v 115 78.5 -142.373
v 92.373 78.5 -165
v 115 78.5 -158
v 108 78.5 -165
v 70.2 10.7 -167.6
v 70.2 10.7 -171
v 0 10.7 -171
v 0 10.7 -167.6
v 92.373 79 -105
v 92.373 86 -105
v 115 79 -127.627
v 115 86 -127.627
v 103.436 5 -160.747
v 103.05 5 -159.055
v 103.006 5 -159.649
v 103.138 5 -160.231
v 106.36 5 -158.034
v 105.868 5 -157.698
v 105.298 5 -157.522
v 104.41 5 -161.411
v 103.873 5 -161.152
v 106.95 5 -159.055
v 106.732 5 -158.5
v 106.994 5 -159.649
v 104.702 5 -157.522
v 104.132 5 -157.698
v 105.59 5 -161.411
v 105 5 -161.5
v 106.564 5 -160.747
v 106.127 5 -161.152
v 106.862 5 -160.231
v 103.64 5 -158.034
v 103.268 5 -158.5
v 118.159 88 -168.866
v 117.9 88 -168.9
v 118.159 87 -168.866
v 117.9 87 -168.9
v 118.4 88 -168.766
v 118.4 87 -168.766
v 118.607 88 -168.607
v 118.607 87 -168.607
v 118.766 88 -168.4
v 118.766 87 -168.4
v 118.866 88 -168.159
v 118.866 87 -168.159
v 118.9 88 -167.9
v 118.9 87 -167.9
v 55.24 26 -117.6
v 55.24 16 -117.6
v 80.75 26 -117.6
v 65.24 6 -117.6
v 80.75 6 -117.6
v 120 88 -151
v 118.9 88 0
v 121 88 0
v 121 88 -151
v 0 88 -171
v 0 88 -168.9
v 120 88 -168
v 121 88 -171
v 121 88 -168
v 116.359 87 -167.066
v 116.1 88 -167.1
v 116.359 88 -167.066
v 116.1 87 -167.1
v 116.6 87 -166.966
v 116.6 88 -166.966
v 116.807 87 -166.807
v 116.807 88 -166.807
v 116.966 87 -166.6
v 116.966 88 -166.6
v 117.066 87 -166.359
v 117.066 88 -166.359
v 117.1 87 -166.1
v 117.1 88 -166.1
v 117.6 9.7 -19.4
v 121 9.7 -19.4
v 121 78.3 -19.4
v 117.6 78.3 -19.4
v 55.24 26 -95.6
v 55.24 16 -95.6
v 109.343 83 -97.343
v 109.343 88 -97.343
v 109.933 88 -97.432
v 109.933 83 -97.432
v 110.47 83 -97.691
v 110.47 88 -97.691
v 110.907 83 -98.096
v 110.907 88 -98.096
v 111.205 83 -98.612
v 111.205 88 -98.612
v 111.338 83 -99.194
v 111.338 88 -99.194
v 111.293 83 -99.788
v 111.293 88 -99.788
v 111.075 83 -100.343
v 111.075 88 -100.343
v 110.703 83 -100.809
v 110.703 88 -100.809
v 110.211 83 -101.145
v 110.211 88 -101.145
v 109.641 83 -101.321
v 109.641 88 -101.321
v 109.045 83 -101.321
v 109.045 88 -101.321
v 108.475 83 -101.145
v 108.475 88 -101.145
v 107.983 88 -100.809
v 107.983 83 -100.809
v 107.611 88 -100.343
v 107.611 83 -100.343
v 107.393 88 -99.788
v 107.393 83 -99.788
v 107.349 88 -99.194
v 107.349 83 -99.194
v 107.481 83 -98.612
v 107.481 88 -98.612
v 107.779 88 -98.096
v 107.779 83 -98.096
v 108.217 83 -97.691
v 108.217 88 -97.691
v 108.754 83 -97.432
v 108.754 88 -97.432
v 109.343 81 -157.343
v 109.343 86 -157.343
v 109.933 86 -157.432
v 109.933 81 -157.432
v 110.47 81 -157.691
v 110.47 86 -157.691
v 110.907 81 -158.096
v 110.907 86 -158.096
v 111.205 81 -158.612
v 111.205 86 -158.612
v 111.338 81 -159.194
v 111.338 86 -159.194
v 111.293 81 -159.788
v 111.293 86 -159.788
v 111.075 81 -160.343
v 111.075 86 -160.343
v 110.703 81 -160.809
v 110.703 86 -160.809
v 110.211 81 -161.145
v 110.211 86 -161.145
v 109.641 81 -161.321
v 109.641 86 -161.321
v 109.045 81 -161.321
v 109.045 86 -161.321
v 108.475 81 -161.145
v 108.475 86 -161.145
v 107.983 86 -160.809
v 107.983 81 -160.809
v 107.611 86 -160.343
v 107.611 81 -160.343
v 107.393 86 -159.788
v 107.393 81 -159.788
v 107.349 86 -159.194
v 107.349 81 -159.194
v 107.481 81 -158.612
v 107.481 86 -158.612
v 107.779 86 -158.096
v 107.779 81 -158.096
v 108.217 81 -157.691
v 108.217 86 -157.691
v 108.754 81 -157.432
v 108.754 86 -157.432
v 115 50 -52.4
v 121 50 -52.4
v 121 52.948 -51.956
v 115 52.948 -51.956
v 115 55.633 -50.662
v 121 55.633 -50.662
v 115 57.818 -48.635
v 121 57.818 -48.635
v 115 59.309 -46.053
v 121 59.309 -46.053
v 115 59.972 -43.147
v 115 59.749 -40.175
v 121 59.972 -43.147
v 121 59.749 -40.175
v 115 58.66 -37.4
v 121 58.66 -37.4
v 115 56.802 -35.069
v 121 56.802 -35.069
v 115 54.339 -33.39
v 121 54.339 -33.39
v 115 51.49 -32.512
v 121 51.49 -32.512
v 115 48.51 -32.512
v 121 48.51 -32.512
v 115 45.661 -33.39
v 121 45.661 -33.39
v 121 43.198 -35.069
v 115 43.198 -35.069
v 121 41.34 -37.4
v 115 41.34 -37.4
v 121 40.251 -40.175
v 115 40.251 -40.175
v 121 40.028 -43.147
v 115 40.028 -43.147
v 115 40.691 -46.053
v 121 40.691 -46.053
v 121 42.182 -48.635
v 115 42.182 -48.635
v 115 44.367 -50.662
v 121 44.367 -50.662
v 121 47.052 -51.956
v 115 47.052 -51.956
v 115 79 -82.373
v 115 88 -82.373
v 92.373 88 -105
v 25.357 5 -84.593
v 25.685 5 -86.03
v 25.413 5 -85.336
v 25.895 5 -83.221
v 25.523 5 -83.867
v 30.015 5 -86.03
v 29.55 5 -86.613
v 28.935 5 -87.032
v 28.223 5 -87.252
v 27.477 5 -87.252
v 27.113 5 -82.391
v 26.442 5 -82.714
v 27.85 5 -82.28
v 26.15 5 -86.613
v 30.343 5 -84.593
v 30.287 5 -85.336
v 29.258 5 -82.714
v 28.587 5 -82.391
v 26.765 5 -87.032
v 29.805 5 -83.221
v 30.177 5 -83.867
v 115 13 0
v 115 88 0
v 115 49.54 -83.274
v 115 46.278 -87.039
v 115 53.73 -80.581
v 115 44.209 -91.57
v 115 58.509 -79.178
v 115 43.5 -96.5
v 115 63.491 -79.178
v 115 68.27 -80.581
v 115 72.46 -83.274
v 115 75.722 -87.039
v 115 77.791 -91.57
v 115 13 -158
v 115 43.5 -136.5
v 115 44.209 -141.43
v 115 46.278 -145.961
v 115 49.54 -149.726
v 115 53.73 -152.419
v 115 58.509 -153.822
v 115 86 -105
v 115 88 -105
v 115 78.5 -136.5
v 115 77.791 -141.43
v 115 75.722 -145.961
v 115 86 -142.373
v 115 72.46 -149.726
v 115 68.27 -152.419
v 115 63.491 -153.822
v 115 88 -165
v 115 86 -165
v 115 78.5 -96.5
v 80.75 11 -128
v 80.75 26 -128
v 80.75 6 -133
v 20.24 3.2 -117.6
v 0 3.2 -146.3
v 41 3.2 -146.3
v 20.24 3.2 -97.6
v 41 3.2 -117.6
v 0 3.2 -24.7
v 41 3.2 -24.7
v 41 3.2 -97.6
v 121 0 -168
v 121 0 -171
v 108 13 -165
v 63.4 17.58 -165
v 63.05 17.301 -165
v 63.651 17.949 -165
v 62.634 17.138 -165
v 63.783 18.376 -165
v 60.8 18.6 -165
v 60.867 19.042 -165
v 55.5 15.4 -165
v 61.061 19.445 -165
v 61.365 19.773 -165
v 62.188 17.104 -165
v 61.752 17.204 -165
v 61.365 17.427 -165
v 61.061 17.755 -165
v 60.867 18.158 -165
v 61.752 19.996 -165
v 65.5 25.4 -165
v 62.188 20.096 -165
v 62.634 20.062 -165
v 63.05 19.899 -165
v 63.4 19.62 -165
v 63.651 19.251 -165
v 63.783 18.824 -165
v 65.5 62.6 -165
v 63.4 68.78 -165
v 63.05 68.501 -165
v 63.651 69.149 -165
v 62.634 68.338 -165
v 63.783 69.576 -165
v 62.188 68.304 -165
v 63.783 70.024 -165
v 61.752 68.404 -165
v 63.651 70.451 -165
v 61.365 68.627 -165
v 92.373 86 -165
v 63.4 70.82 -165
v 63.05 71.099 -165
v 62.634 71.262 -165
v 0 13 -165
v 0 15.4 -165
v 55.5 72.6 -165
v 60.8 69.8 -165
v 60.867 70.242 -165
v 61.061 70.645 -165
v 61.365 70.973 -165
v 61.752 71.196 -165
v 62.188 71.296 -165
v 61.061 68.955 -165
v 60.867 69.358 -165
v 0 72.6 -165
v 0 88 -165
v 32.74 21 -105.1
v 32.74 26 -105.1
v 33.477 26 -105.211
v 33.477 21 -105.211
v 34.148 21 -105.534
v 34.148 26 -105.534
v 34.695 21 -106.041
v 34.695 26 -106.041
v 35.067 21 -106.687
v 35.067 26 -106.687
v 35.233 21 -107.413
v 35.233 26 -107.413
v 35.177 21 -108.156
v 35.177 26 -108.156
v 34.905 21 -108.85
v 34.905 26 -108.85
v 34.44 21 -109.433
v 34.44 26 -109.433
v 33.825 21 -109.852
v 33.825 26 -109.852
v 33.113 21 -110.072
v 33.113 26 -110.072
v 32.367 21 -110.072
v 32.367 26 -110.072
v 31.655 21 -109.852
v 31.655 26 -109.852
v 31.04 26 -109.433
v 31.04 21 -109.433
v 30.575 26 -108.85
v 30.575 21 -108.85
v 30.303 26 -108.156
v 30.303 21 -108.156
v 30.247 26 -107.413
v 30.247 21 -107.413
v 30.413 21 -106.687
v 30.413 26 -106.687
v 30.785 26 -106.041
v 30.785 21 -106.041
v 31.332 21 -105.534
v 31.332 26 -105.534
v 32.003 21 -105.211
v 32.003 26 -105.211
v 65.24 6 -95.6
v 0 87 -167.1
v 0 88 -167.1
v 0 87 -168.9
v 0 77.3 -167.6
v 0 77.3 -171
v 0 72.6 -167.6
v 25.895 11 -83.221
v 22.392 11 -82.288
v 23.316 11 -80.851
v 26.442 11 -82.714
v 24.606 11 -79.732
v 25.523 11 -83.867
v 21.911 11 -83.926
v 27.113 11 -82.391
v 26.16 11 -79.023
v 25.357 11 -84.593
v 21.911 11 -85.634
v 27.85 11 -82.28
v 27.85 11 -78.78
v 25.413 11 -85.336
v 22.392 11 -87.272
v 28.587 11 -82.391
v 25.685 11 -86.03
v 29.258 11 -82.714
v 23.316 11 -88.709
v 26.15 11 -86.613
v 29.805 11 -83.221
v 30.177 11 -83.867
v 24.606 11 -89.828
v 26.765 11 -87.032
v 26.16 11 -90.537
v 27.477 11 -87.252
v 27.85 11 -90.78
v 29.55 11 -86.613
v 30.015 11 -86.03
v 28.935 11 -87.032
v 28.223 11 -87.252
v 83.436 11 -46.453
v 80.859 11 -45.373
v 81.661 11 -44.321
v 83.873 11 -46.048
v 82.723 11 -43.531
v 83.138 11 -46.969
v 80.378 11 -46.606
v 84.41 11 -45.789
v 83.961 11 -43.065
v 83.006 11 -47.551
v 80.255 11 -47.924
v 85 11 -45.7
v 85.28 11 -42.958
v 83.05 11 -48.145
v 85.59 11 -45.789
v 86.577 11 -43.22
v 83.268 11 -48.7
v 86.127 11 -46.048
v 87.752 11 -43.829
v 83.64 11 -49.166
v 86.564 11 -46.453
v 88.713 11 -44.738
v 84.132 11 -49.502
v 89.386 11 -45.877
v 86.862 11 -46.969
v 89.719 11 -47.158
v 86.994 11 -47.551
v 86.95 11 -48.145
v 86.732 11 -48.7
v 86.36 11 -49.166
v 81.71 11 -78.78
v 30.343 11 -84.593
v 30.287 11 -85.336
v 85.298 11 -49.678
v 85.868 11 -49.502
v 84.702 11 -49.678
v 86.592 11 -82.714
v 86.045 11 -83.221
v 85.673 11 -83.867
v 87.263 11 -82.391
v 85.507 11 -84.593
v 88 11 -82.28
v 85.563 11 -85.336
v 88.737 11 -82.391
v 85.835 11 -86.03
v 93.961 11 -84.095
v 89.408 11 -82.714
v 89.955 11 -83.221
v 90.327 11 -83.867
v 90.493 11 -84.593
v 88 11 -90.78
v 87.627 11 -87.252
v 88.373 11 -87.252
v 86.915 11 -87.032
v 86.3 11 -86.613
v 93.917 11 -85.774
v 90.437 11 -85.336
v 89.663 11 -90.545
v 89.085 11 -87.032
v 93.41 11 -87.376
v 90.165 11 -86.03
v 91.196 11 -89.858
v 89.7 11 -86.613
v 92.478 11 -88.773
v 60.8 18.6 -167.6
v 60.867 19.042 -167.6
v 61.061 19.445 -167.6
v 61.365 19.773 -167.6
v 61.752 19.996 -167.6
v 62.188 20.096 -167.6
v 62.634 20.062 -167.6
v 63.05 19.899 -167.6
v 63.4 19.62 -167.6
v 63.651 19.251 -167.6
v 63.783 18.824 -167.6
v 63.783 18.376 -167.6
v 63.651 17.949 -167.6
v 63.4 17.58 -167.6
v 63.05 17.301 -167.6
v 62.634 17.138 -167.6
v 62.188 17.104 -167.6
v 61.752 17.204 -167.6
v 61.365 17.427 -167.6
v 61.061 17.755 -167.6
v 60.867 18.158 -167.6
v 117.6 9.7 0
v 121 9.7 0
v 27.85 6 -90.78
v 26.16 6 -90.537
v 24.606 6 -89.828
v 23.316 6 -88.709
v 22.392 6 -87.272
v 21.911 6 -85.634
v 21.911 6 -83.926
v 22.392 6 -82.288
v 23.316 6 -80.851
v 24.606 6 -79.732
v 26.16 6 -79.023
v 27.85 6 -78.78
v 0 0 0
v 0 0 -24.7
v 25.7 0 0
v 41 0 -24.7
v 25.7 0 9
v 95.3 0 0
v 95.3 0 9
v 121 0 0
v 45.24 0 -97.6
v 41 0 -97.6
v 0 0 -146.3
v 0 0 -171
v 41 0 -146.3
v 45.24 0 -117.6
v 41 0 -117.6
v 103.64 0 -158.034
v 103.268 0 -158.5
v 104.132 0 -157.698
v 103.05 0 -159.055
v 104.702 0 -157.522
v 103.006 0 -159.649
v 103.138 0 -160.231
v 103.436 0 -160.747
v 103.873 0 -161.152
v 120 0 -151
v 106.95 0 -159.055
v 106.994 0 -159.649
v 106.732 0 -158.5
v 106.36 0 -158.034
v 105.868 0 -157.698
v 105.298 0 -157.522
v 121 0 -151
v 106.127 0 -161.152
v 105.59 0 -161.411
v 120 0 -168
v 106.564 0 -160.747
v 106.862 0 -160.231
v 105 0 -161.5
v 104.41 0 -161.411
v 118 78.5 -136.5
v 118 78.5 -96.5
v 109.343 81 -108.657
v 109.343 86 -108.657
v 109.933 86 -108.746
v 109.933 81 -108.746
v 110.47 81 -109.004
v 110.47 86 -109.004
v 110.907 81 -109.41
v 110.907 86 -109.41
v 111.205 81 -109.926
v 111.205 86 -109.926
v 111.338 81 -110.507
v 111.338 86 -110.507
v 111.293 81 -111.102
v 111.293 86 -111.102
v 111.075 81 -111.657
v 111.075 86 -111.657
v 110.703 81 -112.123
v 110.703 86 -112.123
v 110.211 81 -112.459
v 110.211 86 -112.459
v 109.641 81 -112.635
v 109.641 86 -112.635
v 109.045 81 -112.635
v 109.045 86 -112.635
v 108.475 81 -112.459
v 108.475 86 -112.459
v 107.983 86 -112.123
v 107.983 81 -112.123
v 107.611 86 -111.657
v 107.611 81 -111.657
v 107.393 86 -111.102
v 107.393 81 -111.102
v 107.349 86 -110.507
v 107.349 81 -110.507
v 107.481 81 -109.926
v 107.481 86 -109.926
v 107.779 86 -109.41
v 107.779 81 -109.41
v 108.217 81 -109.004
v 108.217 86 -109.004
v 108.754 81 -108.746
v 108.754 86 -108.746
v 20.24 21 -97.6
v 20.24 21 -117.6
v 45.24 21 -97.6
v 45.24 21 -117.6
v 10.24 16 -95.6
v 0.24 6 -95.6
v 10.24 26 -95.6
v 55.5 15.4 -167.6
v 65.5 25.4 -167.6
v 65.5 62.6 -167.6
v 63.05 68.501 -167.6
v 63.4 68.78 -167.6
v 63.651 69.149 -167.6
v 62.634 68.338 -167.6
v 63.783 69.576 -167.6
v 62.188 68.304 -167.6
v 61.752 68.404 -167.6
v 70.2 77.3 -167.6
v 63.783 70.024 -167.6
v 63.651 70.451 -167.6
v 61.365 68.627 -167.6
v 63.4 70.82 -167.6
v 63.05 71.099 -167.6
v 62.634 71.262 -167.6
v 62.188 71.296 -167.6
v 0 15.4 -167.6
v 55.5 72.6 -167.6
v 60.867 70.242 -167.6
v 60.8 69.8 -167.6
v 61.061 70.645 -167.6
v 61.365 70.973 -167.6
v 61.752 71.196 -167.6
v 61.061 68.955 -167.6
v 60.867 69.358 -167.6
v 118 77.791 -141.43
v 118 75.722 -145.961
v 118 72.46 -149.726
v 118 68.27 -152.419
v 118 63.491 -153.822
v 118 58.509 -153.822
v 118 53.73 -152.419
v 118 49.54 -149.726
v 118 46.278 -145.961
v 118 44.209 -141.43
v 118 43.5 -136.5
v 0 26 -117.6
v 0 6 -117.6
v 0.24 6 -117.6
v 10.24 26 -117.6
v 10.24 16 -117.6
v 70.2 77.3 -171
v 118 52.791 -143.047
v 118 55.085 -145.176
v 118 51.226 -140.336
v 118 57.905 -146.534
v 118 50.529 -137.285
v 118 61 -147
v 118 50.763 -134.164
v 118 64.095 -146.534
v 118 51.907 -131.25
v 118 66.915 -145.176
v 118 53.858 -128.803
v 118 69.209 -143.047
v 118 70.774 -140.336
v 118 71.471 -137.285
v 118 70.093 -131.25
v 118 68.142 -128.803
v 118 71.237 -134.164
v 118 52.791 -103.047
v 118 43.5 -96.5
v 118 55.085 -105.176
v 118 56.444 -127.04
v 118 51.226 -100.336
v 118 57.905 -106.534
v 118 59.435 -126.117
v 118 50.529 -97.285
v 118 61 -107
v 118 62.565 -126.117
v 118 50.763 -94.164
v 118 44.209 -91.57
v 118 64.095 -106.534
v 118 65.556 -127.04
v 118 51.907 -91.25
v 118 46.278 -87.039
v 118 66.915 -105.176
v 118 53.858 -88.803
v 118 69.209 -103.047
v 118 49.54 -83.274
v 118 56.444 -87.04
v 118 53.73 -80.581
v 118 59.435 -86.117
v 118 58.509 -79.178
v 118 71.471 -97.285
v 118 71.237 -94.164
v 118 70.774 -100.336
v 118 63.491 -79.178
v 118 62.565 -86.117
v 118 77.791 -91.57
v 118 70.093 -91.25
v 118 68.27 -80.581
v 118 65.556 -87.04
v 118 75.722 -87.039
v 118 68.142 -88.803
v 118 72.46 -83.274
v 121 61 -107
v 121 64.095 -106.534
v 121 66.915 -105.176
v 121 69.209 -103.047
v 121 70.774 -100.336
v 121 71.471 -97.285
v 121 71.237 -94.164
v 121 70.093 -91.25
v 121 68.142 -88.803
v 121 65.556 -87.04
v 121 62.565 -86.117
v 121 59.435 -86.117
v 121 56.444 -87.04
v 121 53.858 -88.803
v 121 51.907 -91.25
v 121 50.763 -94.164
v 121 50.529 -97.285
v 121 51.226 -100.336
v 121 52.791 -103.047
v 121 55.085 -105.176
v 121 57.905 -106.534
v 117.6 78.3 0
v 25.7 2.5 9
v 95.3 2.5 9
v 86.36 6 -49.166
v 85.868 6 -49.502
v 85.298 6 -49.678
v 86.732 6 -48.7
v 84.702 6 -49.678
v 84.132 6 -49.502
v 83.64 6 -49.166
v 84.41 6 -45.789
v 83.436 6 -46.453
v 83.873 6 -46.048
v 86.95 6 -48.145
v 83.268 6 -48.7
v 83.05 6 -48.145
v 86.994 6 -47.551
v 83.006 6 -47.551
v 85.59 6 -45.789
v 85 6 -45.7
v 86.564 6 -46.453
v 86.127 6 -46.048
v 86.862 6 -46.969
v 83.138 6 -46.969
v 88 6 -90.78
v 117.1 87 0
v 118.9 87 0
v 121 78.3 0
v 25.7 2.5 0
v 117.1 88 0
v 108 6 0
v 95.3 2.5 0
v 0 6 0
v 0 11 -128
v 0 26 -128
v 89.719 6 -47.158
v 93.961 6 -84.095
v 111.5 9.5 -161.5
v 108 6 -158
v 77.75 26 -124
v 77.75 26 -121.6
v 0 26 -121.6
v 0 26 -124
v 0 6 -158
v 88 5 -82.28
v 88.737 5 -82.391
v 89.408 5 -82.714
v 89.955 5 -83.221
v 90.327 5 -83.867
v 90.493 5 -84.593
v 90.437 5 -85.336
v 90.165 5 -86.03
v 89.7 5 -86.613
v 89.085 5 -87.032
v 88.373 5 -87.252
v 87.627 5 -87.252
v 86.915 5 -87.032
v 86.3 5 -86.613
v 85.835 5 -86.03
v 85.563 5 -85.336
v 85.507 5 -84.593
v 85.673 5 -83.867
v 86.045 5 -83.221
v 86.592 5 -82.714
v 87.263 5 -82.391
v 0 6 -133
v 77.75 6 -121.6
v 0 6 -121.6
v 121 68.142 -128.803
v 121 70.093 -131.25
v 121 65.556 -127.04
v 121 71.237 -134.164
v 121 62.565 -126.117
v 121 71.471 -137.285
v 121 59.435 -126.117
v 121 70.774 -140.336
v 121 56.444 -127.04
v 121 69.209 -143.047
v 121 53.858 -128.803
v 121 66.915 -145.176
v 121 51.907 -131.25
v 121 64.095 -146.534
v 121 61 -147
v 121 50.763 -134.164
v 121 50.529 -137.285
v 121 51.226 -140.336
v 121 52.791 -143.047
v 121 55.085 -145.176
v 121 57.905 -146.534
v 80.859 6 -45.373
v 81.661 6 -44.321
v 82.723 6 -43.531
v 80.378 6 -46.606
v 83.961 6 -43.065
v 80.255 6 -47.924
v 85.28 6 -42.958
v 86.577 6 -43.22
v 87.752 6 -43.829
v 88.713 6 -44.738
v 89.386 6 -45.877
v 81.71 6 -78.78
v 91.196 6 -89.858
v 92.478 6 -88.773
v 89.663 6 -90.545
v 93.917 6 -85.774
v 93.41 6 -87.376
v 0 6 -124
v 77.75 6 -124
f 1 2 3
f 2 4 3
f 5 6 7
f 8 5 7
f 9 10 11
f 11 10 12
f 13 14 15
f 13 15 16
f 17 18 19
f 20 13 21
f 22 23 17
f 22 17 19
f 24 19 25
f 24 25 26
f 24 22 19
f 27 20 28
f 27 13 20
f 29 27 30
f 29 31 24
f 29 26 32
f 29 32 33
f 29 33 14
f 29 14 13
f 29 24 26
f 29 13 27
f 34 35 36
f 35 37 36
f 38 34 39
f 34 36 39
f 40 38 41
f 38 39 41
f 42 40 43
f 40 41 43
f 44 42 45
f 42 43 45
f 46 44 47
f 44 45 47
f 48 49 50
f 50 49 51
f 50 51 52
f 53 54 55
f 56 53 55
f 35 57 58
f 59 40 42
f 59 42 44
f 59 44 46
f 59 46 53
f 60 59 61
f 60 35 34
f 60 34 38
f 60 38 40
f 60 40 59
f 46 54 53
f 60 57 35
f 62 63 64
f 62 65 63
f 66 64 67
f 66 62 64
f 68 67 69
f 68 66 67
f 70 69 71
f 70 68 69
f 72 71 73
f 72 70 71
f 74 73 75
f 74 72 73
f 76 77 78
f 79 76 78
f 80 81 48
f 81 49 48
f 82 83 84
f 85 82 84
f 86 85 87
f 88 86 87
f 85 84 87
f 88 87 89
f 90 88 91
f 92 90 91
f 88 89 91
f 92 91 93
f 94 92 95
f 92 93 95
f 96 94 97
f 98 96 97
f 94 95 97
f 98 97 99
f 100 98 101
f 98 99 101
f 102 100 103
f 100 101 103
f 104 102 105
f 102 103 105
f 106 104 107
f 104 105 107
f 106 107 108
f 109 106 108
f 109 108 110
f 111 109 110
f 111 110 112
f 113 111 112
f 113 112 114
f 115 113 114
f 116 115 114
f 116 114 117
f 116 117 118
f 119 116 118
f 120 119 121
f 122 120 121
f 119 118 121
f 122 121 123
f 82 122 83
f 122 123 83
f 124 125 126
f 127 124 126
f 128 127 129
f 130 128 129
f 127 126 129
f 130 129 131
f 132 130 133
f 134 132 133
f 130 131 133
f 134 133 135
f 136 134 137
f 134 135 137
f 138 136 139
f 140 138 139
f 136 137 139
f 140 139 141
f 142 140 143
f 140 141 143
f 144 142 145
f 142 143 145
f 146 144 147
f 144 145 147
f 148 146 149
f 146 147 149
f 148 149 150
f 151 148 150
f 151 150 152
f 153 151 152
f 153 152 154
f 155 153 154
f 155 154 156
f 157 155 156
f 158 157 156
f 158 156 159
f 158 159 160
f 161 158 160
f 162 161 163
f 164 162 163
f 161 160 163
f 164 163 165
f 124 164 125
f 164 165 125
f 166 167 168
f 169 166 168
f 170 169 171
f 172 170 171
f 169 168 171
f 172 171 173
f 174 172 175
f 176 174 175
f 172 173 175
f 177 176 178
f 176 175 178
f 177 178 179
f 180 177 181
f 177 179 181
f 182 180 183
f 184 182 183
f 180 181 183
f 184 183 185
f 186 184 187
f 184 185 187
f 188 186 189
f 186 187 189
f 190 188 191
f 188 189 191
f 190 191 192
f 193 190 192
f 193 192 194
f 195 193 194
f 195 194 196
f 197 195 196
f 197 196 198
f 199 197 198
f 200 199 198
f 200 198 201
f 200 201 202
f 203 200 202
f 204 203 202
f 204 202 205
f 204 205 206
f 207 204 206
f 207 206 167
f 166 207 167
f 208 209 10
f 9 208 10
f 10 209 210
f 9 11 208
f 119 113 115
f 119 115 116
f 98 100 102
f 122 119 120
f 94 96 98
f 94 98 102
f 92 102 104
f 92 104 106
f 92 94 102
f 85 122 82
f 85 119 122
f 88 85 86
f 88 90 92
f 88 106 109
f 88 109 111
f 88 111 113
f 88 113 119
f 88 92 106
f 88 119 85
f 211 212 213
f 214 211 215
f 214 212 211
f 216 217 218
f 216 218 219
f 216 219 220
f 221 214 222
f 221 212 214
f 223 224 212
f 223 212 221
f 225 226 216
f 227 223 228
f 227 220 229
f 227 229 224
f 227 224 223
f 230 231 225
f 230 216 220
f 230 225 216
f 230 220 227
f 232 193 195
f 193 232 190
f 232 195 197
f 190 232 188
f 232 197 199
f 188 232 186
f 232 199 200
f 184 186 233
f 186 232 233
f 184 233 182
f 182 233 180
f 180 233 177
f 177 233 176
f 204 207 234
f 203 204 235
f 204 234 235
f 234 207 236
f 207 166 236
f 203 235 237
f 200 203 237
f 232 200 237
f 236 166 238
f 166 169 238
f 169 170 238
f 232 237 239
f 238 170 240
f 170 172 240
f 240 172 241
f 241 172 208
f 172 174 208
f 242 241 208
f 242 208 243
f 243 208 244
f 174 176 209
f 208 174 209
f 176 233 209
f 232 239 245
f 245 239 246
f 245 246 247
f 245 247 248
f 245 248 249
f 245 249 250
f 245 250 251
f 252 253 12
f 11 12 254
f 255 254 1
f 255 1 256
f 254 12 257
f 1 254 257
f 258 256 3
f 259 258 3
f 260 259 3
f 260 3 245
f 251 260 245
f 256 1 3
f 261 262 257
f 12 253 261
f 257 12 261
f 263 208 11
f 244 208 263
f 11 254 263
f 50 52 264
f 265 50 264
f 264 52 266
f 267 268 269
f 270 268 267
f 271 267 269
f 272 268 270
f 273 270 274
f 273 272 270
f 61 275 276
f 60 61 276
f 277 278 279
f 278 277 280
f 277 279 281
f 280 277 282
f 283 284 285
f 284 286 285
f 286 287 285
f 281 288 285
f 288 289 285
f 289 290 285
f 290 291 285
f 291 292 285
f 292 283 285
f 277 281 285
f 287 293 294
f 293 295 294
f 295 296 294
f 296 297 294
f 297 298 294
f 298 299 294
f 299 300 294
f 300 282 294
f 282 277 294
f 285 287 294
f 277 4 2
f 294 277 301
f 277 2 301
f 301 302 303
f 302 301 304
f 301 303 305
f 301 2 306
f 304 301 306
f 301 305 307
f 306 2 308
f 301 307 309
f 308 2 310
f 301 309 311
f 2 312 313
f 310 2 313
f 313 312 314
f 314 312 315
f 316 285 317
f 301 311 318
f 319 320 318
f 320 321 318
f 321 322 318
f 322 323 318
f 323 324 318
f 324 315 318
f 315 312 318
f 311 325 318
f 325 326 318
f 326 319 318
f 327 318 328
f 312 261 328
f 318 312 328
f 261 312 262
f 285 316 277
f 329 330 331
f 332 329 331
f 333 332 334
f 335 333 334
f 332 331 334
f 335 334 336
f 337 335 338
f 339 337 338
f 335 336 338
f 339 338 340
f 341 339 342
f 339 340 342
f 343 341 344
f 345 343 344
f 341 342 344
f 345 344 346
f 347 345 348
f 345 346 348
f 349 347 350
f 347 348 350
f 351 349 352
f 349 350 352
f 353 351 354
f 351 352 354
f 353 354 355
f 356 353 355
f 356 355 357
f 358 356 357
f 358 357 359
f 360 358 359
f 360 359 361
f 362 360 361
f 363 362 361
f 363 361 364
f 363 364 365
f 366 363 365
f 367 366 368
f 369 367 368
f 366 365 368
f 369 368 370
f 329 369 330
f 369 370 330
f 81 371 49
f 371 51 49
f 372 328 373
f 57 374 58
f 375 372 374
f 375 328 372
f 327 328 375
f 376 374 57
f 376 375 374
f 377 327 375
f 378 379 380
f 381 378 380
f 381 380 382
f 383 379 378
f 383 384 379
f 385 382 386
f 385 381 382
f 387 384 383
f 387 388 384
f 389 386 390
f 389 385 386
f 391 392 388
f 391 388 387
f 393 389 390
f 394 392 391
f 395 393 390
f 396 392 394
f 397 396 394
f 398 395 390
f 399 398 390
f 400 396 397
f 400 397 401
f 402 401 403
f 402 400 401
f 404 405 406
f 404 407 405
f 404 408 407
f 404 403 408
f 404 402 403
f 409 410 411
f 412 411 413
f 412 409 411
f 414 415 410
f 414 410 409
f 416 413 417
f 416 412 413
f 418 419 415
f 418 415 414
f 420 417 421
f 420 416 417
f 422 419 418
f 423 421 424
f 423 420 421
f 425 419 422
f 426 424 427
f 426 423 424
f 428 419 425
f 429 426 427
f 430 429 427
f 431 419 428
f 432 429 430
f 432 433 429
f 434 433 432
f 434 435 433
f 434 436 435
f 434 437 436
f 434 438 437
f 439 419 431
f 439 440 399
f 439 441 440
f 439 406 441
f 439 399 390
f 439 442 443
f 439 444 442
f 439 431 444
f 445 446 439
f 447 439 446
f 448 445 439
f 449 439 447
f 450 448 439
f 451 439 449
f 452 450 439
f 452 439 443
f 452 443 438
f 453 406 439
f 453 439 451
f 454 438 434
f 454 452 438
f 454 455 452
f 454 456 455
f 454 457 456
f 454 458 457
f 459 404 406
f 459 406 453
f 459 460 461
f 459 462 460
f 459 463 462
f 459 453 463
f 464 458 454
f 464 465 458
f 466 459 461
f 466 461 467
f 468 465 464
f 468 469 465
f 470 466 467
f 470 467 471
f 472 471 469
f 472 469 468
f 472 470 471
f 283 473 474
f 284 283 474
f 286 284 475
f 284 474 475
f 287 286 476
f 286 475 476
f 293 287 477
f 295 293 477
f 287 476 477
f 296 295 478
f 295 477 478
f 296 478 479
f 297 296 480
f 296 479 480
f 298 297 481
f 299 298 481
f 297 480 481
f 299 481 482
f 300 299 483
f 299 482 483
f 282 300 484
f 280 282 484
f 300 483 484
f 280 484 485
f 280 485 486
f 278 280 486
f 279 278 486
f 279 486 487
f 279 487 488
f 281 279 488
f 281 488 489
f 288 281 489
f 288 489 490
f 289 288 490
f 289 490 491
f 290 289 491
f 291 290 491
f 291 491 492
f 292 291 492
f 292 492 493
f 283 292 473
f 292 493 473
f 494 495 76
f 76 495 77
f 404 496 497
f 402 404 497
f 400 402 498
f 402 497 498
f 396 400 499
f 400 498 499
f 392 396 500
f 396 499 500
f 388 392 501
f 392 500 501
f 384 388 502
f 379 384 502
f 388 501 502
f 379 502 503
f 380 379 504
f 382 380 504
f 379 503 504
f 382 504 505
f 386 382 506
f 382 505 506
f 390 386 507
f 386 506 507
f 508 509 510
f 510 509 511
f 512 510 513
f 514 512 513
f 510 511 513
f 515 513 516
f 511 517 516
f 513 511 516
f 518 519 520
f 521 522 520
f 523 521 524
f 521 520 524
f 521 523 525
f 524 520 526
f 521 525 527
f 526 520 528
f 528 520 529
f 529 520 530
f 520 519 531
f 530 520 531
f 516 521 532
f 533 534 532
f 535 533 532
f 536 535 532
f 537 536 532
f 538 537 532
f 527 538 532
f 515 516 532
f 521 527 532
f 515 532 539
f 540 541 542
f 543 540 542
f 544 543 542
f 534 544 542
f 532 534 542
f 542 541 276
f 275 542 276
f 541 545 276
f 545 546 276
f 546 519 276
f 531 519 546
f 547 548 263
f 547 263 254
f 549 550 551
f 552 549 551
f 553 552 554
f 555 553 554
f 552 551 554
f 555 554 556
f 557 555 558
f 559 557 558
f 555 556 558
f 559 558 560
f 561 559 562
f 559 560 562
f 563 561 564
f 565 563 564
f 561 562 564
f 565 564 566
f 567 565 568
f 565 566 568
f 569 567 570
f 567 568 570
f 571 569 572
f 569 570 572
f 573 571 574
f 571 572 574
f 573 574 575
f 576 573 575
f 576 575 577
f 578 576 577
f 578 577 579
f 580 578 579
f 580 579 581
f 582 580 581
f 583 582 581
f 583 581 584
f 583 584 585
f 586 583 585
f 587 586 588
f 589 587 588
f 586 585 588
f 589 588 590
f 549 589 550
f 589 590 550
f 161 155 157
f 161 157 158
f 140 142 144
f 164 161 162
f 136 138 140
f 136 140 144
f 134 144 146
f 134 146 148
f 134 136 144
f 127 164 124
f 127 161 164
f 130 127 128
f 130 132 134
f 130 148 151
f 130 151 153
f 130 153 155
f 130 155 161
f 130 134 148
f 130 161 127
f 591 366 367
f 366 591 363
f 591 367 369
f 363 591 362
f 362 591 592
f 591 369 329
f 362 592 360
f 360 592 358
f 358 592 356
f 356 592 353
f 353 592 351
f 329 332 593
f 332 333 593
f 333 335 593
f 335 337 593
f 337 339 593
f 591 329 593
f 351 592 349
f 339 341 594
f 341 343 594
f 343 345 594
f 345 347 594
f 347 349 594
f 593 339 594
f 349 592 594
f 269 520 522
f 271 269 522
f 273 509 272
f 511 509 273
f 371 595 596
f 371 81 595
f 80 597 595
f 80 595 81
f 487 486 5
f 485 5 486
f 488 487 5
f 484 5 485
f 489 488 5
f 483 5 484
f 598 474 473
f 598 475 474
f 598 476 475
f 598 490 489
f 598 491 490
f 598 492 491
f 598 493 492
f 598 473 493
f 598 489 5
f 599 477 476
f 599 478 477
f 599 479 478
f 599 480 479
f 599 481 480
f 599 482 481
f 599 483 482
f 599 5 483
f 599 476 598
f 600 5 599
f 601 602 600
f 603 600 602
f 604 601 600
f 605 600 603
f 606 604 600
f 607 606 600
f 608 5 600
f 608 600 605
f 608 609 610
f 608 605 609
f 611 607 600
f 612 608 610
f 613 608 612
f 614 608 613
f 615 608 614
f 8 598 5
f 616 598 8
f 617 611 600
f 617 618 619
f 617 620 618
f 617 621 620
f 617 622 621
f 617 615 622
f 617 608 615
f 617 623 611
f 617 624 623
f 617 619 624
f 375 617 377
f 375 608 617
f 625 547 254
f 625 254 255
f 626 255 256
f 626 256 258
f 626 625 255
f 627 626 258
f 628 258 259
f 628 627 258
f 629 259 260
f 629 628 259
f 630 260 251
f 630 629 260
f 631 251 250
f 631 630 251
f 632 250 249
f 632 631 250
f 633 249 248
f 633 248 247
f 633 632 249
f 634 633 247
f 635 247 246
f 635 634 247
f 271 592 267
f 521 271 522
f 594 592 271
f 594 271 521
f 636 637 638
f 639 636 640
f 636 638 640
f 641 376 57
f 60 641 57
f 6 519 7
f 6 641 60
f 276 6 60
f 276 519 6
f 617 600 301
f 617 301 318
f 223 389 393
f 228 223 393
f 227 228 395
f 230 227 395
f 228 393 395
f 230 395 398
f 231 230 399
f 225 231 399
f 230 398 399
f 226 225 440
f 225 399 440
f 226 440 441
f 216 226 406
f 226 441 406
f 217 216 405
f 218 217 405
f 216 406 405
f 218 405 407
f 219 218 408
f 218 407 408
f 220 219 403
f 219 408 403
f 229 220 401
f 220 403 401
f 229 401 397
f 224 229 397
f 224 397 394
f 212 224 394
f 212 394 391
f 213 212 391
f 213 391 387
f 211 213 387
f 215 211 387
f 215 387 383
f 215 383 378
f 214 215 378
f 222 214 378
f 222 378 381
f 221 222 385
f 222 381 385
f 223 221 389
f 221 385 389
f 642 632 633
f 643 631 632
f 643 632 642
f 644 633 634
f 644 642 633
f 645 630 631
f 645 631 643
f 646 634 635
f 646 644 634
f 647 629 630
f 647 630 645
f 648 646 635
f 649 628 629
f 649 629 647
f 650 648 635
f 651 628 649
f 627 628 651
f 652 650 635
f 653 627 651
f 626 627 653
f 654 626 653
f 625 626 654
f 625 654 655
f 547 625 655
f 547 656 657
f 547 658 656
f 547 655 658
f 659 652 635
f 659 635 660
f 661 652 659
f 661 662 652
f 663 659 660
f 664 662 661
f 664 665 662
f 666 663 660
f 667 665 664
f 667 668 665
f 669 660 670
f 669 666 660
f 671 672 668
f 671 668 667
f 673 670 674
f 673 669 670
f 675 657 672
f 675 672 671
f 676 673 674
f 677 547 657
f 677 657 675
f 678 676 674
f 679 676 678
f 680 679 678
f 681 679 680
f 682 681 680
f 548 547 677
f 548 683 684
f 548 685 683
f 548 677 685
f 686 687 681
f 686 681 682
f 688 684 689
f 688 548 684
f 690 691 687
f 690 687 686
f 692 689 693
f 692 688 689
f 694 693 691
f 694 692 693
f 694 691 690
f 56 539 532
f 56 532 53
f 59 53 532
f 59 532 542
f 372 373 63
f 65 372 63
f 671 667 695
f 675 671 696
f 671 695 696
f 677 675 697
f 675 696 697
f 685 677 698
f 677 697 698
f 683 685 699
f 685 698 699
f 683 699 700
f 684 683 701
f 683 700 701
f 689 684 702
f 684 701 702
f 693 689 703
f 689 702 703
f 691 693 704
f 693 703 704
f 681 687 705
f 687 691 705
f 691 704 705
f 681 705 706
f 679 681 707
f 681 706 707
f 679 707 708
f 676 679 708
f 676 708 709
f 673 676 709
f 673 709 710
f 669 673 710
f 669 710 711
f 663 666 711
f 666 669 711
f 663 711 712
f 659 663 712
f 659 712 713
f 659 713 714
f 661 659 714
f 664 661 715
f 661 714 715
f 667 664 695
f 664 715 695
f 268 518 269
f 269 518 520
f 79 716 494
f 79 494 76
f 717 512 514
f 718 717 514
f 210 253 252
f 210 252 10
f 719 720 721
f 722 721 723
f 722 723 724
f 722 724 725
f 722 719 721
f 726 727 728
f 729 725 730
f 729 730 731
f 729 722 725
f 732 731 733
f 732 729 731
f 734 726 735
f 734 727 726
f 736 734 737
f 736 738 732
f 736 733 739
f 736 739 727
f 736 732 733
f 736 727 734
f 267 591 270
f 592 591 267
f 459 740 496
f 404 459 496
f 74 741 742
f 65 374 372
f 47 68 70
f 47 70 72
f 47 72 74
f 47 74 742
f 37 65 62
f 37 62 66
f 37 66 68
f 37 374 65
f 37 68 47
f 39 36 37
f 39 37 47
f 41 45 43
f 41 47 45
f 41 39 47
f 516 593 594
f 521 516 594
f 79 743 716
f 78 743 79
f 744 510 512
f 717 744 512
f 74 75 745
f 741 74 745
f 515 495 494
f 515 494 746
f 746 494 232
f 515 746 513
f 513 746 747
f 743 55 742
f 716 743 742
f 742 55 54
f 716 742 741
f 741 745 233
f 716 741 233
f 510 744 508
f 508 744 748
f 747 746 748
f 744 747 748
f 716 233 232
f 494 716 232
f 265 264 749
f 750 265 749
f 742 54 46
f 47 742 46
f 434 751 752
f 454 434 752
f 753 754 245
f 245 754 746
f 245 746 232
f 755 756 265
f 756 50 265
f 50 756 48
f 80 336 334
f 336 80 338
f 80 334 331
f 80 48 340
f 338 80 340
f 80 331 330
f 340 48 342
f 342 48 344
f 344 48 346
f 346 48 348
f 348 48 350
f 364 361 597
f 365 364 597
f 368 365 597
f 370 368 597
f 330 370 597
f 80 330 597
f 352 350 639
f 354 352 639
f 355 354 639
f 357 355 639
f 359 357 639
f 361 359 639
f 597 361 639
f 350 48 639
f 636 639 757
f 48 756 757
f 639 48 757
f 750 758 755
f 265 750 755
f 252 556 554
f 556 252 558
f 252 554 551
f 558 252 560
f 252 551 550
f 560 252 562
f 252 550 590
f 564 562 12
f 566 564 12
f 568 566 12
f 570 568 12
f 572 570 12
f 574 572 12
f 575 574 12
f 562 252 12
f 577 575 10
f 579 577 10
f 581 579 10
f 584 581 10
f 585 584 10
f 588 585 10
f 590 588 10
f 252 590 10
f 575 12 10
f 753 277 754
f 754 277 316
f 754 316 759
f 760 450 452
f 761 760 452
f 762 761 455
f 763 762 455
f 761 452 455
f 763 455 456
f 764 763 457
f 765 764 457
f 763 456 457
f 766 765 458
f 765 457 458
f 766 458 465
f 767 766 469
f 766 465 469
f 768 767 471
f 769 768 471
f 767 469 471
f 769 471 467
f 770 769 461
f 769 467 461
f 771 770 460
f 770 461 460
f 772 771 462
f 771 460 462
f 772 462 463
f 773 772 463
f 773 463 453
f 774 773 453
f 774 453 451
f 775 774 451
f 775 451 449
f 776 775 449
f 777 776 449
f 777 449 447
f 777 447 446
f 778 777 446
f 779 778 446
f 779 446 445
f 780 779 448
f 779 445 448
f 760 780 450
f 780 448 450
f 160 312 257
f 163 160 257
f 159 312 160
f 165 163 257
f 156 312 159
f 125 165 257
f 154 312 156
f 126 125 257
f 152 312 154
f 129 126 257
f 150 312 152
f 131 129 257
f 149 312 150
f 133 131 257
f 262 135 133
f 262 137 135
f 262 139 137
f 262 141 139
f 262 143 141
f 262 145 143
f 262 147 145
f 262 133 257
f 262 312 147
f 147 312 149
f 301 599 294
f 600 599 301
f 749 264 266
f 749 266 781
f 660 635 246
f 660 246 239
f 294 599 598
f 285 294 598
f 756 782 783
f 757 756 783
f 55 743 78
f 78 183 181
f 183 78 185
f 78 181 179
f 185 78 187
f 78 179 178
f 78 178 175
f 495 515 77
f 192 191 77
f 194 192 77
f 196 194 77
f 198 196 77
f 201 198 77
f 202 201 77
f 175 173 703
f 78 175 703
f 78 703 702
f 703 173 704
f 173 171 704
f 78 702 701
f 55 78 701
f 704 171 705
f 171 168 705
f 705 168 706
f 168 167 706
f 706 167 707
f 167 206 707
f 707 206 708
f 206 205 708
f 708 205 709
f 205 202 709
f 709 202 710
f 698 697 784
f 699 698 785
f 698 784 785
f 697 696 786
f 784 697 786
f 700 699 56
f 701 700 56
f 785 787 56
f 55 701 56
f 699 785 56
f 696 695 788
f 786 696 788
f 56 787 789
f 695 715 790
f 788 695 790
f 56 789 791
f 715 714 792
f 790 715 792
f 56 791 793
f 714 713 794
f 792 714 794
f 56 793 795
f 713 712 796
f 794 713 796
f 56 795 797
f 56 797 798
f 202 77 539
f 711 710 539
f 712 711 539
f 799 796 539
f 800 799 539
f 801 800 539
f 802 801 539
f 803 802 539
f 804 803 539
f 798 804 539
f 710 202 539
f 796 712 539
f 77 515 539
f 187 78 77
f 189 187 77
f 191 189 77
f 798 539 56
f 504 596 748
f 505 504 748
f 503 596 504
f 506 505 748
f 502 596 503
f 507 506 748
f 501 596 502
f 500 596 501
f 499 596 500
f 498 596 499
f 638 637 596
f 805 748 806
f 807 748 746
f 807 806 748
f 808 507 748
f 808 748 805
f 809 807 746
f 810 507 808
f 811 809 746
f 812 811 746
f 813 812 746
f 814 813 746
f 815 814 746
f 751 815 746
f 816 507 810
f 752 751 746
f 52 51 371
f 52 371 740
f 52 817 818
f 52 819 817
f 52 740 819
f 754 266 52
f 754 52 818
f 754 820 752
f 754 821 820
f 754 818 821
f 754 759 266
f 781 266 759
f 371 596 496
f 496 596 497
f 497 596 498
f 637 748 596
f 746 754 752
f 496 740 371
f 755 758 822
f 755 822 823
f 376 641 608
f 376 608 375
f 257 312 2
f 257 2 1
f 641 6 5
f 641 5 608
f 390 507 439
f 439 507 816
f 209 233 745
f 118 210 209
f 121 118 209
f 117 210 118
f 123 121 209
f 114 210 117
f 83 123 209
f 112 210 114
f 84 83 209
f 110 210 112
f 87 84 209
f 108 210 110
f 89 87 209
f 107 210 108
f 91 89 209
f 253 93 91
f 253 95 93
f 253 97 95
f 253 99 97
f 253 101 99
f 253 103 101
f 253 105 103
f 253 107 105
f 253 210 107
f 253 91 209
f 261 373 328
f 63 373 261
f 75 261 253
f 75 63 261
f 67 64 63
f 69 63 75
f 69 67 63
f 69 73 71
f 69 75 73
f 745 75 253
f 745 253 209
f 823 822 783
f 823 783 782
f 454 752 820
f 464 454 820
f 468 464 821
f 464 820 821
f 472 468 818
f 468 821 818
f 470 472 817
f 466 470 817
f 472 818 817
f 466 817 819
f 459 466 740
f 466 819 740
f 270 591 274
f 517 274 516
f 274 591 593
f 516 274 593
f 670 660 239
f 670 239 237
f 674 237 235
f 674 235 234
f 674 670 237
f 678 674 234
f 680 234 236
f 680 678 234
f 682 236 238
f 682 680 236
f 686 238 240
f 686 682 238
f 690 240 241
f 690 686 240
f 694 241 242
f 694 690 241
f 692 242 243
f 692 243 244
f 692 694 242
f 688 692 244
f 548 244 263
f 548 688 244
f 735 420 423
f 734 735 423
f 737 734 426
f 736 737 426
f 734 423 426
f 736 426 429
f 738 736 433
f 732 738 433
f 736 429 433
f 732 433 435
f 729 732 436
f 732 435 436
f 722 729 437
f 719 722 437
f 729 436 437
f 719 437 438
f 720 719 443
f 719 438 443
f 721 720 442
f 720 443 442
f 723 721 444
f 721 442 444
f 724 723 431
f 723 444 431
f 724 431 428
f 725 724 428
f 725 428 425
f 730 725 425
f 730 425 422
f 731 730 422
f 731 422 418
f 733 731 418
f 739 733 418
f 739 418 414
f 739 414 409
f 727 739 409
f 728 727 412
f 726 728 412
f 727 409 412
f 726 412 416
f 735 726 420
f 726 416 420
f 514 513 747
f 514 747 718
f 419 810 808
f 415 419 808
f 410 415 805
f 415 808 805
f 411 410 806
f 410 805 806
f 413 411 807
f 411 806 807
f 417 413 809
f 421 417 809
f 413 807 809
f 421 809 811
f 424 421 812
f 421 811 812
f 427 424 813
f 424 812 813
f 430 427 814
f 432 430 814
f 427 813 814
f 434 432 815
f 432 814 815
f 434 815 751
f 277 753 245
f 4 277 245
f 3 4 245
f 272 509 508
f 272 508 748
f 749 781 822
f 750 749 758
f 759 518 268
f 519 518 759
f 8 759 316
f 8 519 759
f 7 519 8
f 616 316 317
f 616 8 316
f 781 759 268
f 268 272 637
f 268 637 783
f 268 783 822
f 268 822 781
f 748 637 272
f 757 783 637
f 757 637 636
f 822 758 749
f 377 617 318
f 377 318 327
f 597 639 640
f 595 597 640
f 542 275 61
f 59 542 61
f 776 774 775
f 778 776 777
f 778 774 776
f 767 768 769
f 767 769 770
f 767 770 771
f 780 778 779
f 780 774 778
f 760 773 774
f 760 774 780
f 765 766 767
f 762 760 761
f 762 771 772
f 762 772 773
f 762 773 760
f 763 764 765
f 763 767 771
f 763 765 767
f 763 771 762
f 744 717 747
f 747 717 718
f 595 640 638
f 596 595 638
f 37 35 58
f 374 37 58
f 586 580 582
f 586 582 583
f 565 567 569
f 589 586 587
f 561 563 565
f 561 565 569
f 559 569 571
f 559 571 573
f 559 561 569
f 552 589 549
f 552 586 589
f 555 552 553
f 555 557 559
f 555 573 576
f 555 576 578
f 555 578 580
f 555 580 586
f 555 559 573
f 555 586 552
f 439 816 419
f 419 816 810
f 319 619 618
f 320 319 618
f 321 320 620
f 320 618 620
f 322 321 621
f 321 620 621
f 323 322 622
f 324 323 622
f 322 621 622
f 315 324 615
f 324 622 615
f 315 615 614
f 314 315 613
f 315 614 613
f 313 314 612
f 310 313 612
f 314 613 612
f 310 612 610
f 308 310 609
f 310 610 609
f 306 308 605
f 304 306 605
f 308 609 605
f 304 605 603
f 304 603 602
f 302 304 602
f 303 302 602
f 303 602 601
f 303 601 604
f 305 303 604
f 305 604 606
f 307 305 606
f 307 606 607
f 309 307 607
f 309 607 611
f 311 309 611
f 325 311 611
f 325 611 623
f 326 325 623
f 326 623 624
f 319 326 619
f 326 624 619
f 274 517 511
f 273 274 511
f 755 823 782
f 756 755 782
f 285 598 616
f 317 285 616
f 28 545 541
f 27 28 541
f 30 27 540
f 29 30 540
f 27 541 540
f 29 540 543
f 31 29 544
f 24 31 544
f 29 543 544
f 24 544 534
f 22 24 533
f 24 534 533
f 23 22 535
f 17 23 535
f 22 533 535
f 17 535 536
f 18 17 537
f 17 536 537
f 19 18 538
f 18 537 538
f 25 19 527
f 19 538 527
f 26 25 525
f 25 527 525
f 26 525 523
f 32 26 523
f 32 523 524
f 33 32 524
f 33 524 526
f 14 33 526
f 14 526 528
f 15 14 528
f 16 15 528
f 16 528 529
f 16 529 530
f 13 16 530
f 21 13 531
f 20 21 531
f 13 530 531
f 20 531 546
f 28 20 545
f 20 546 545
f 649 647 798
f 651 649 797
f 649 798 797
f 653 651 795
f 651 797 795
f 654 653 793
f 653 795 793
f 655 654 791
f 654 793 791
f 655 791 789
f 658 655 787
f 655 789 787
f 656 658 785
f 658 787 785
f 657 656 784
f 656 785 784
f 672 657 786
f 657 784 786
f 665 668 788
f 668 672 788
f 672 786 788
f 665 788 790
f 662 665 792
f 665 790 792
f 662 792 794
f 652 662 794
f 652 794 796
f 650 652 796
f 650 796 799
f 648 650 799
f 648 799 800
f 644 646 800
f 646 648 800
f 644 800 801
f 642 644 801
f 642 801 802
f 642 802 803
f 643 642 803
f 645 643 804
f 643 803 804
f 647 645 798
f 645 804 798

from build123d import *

# Parameters (mm, degrees)
SKETCH2_W               = 121
SKETCH2_H               = 171
BOSS_EXTRUDE1_DEPTH     = 88
SKETCH4_W               = 115
SKETCH4_H               = 165
CUT_EXTRUDE1_DEPTH      = 82
SKETCH5_W               = 41
SKETCH5_H               = 121.6
CUT_EXTRUDE2_DEPTH      = 3.2
SKETCH6_W               = 69.6
SKETCH6_H               = 9
BOSS_EXTRUDE2_DEPTH     = 2.5
SKETCH7_W               = 19.4
SKETCH7_H               = 68.6
CUT_EXTRUDE3_DEPTH      = 3.4
SKETCH9_W               = 70.2
SKETCH9_H               = 66.6
CUT_EXTRUDE4_DEPTH      = 3.4
SKETCH10_W              = 65.5
SKETCH10_H              = 57.2
CUT_EXTRUDE5_DEPTH      = 2.6
SKETCH11_R              = 10.5
SKETCH11_R_2            = 10
CUT_EXTRUDE6_DEPTH      = 228.213555934
BOSS_EXTRUDE4_DEPTH     = 7.5
BOSS_EXTRUDE5_DEPTH     = 9
CUT_EXTRUDE10_DEPTH     = 2
BOSS_EXTRUDE6_DEPTH     = 72.5
SKETCH18_R              = 2
CUT_EXTRUDE11_DEPTH     = 5
SKETCH19_R              = 2
CUT_EXTRUDE12_DEPTH     = 5
SKETCH20_R              = 4.75
BOSS_EXTRUDE7_DEPTH     = 5
SKETCH21_R              = 2
CUT_EXTRUDE13_DEPTH     = 5
SKETCH22_R              = 2.5
CUT_EXTRUDE14_DEPTH     = 6
BOSS_EXTRUDE17_REACH    = 229.214
BOSS_EXTRUDE18_REACH    = 229.214
BOSS_EXTRUDE19_DEPTH    = 5
BOSS_EXTRUDE20_DEPTH    = 20
BOSS_EXTRUDE22_DEPTH    = 20
CHAMFER1_SIZE           = 10
CHAMFER2_SIZE           = 10
SKETCH38_R              = 2.5
CUT_EXTRUDE15_DEPTH     = 5
CHAMFER3_SIZE           = 5
CUT_EXTRUDE16_START     = -3
CUT_EXTRUDE16_OUTLINE_R = 10.5
CUT_EXTRUDE16_DEPTH     = 3
CUT_EXTRUDE17_DEPTH     = 1
SKETCH42_W              = 17
SKETCH42_H              = 88
CUT_EXTRUDE18_DEPTH     = 1
SKETCH44_W              = 77.75
SKETCH44_H              = 20
BOSS_EXTRUDE25_DEPTH    = 1
BOSS_EXTRUDE26_DEPTH    = 2.6
SKETCH46_R              = 1.5
CUT_EXTRUDE19_DEPTH     = 2.6
FILLET1_R               = 1
SKETCH48_W              = 25
SKETCH48_H              = 20
CUT_EXTRUDE21_DEPTH     = 10
BOSS_EXTRUDE27_DEPTH    = 2
SKETCH50_R              = 2
CUT_EXTRUDE22_DEPTH     = 5


# Read off the part's stored shape, not the designer's step: Cut-Extrude16
with BuildPart() as part:
    # Sketch2 → Boss-Extrude1 (new body)
    with BuildSketch(Plane(origin=(0, 0, 0), x_dir=(1, 0, 0), z_dir=(0, 1, 0))):
        with Locations((60.5, 85.5)):
            Rectangle(SKETCH2_W, SKETCH2_H)
    extrude(amount=BOSS_EXTRUDE1_DEPTH)

    # Sketch4 → Cut-Extrude1 (cut)
    with BuildSketch(Plane(origin=(0, 88, 0), x_dir=(1, 0, 0), z_dir=(0, 1, 0))):
        with Locations((57.5, 82.5)):
            Rectangle(SKETCH4_W, SKETCH4_H)
    extrude(amount=-CUT_EXTRUDE1_DEPTH, mode=Mode.SUBTRACT)

    # Sketch5 → Cut-Extrude2 (cut)
    with BuildSketch(Plane.XZ):
        with Locations((20.5, -85.5)):
            Rectangle(SKETCH5_W, SKETCH5_H)
    extrude(amount=-CUT_EXTRUDE2_DEPTH, mode=Mode.SUBTRACT)

    # Sketch6 → Boss-Extrude2 (add)
    with BuildSketch(Plane.XZ):
        with Locations((60.5, 4.5)):
            Rectangle(SKETCH6_W, SKETCH6_H)
    extrude(amount=-BOSS_EXTRUDE2_DEPTH)

    # Sketch7 → Cut-Extrude3 (cut)
    with BuildSketch(Plane(origin=(121, 0, 0), x_dir=(0, 0, -1), z_dir=(1, 0, 0))):
        with Locations((9.7, 44)):
            Rectangle(SKETCH7_W, SKETCH7_H)
    extrude(amount=-CUT_EXTRUDE3_DEPTH, mode=Mode.SUBTRACT)

    # Sketch9 → Cut-Extrude4 (cut)
    with BuildSketch(Plane(origin=(0, 0, -171), x_dir=(-1, 0, 0), z_dir=(0, 0, -1))):
        with Locations((-35.1, 44)):
            Rectangle(SKETCH9_W, SKETCH9_H)
    extrude(amount=-CUT_EXTRUDE4_DEPTH, mode=Mode.SUBTRACT)

    # Sketch10 → Cut-Extrude5 (cut)
    with BuildSketch(Plane(origin=(0, 0, -167.6), x_dir=(-1, 0, 0), z_dir=(0, 0, -1))):
        with Locations((-32.75, 44)):
            Rectangle(SKETCH10_W, SKETCH10_H)
    extrude(amount=-CUT_EXTRUDE5_DEPTH, mode=Mode.SUBTRACT)

    # Sketch11 → Cut-Extrude6 (cut, through all)
    with BuildSketch(Plane(origin=(121, 0, 0), x_dir=(0, 0, -1), z_dir=(1, 0, 0))):
        with Locations((136.5, 61)):
            Circle(SKETCH11_R)
        with Locations((96.5, 61)):
            Circle(SKETCH11_R)
        with Locations((42.4, 50)):
            Circle(SKETCH11_R_2)
    extrude(amount=-CUT_EXTRUDE6_DEPTH, mode=Mode.SUBTRACT)

    # Sketch14 → Boss-Extrude4 (add)
    with BuildSketch(Plane(origin=(0, 86, 0), x_dir=(1, 0, 0), z_dir=(0, 1, 0))):
        Polygon((115, 142.372583002), (115, 165), (92.372583002, 165), align=None)
    extrude(amount=-BOSS_EXTRUDE4_DEPTH)

    # Sketch15 → Boss-Extrude5 (add)
    with BuildSketch(Plane(origin=(0, 88, 0), x_dir=(1, 0, 0), z_dir=(0, 1, 0))):
        Polygon((115, 105), (115, 82.372583002), (92.372583002, 105), (115, 127.627416998), align=None)
    extrude(amount=-BOSS_EXTRUDE5_DEPTH)

    # Sketch16 → Cut-Extrude10 (cut)
    with BuildSketch(Plane(origin=(0, 88, 0), x_dir=(1, 0, 0), z_dir=(0, 1, 0))):
        Polygon((115, 127.627416998), (115, 105), (92.372583002, 105), align=None)
    extrude(amount=-CUT_EXTRUDE10_DEPTH, mode=Mode.SUBTRACT)

    # Sketch17 → Boss-Extrude6 (add)
    with BuildSketch(Plane(origin=(0, 6, 0), x_dir=(1, 0, 0), z_dir=(0, 1, 0))):
        Polygon((115, 165), (108, 165), (115, 158), align=None)
    extrude(amount=BOSS_EXTRUDE6_DEPTH)

    # Sketch18 → Cut-Extrude11 (cut)
    with BuildSketch(Plane(origin=(0, 86, 0), x_dir=(1, 0, 0), z_dir=(0, 1, 0))):
        with Locations(Location((109.343145751, 159.343145751, 0), (0, 0, 270))):
            Circle(SKETCH18_R)
        with Locations(Location((109.343145751, 110.656854249, 0), (0, 0, 270))):
            Circle(SKETCH18_R)
    extrude(amount=-CUT_EXTRUDE11_DEPTH, mode=Mode.SUBTRACT)

    # Sketch19 → Cut-Extrude12 (cut)
    with BuildSketch(Plane(origin=(0, 88, 0), x_dir=(1, 0, 0), z_dir=(0, 1, 0))):
        with Locations(Location((109.343145751, 99.343145751, 0), (0, 0, 270))):
            Circle(SKETCH19_R)
    extrude(amount=-CUT_EXTRUDE12_DEPTH, mode=Mode.SUBTRACT)

    # Sketch20 → Boss-Extrude7 (add)
    with BuildSketch(Plane(origin=(0, 6, 0), x_dir=(1, 0, 0), z_dir=(0, 1, 0))):
        with Locations(Location((85, 47.7, 0), (0, 0, 90))):
            Circle(SKETCH20_R)
        with BuildLine():
            Line((27.85, 78.78), (88, 78.78))
            ThreePointArc((88, 78.78), (94, 84.78), (88, 90.78))
            Line((88, 90.78), (27.85, 90.78))
            ThreePointArc((27.85, 90.78), (21.85, 84.78), (27.85, 78.78))
        make_face()
    extrude(amount=BOSS_EXTRUDE7_DEPTH)

    # Sketch21 → Cut-Extrude13 (cut)
    with BuildSketch(Plane(origin=(0, 11, 0), x_dir=(1, 0, 0), z_dir=(0, 1, 0))):
        with Locations(Location((85, 47.7, 0), (0, 0, 270))):
            Circle(SKETCH21_R)
    extrude(amount=-CUT_EXTRUDE13_DEPTH, mode=Mode.SUBTRACT)

    # Sketch22 → Cut-Extrude14 (cut)
    with BuildSketch(Plane(origin=(0, 11, 0), x_dir=(1, 0, 0), z_dir=(0, 1, 0))):
        with Locations(Location((88, 84.78, 0), (0, 0, 270))):
            Circle(SKETCH22_R)
        with Locations(Location((27.85, 84.78, 0), (0, 0, 270))):
            Circle(SKETCH22_R)
    extrude(amount=-CUT_EXTRUDE14_DEPTH, mode=Mode.SUBTRACT)

    # Boss-Extrude17: up to this plane
    boss_extrude17_end = Plane(origin=(108, 88.399494937, -165), z_dir=(0.7071067811865476, 0, -0.7071067811865476))
    # Sketch33 → Boss-Extrude17 (add, up to the surface)
    with BuildSketch(Plane.XY, mode=Mode.PRIVATE) as boss_extrude17_sk1:
        Polygon((108, 6), (115, 13), (115, 6), align=None)
    boss_extrude17_tool1 = split(extrude(boss_extrude17_sk1.sketch, amount=-BOSS_EXTRUDE17_REACH, mode=Mode.PRIVATE), bisect_by=boss_extrude17_end, keep=Keep.BOTH, mode=Mode.PRIVATE)
    add(boss_extrude17_tool1.solids().sort_by_distance((112.666667, 8.333333, 0))[0])

    # Boss-Extrude18: up to this plane
    boss_extrude18_end = Plane(origin=(108, 88.399494937, -165), z_dir=(0.7071067811865476, 0, -0.7071067811865476))
    # Sketch34 → Boss-Extrude18 (add, up to the surface)
    with BuildSketch(Plane.ZY, mode=Mode.PRIVATE) as boss_extrude18_sk1:
        Polygon((-165, 6), (-165, 13), (-158, 6), align=None)
    boss_extrude18_tool1 = split(extrude(boss_extrude18_sk1.sketch, amount=-BOSS_EXTRUDE18_REACH, mode=Mode.PRIVATE), bisect_by=boss_extrude18_end, keep=Keep.BOTH, mode=Mode.PRIVATE)
    add(boss_extrude18_tool1.solids().sort_by_distance((0, 8.333333, -162.666667))[0])

    # Sketch35 → Boss-Extrude19 (add)
    with BuildSketch(Plane(origin=(0, 6, 0), x_dir=(1, 0, 0), z_dir=(0, 1, 0))):
        with BuildLine():
            Line((82.006660465, 85.062632648), (80.255272868, 47.923750847))
            ThreePointArc((80.255272868, 47.923750847), (85.383052558, 52.434529622), (89.718985156, 47.158078331))
            Line((89.718985156, 47.158078331), (93.960823355, 84.095467366))
            ThreePointArc((93.960823355, 84.095467366), (87.516144137, 78.799541531), (82.006660465, 85.062632648))
        make_face()
    extrude(amount=BOSS_EXTRUDE19_DEPTH)

    # Sketch36 → Boss-Extrude20 (add)
    with BuildSketch(Plane(origin=(0, 6, 0), x_dir=(1, 0, 0), z_dir=(0, 1, 0))):
        Polygon((80.75, 128), (0, 128), (0, 125), (77.75, 125), (77.75, 121.6), (0, 121.6), (0, 117.6), (80.75, 117.6), align=None)
    extrude(amount=BOSS_EXTRUDE20_DEPTH)

    # Sketch37 → Boss-Extrude22 (add)
    with BuildSketch(Plane.XY.offset(-117.6)):
        Polygon((55.24, 26), (10.24, 26), (10.24, 6), (20.24, 6), (20.24, 21), (45.24, 21), (45.24, 6), (55.24, 6), align=None)
    extrude(amount=BOSS_EXTRUDE22_DEPTH)

    # Chamfer1
    chamfer1_edges = [part.edges().sort_by_distance(p)[0] for p in [
        (10.24, 6, -107.6),
    ]]
    chamfer(chamfer1_edges, length=CHAMFER1_SIZE)

    # Chamfer2
    chamfer2_edges = [part.edges().sort_by_distance(p)[0] for p in [
        (55.24, 6, -107.6),
    ]]
    chamfer(chamfer2_edges, length=CHAMFER2_SIZE)

    # Sketch38 → Cut-Extrude15 (cut)
    with BuildSketch(Plane(origin=(0, 26, 0), x_dir=(1, 0, 0), z_dir=(0, 1, 0))):
        with Locations(Location((32.74, 107.6, 0), (0, 0, 270))):
            Circle(SKETCH38_R)
    extrude(amount=-CUT_EXTRUDE15_DEPTH, mode=Mode.SUBTRACT)

    # Chamfer3
    chamfer3_edges = [part.edges().sort_by_distance(p)[0] for p in [
        (40.375, 6, -128),
    ]]
    chamfer(chamfer3_edges, length=CHAMFER3_SIZE)

    # Cut-Extrude16 outline → Cut-Extrude16 (cut)
    with BuildSketch(Plane.ZY.offset(-115).offset(CUT_EXTRUDE16_START)):
        with BuildLine():
            Line((-96.5, 78.5), (-136.5, 78.5))
            ThreePointArc((-136.5, 78.5), (-154, 61), (-136.5, 43.5))
            Line((-136.5, 43.5), (-96.5, 43.5))
            ThreePointArc((-96.5, 43.5), (-79, 61), (-96.5, 78.5))
        make_face()
        with Locations((-136.5, 61)):
            Circle(CUT_EXTRUDE16_OUTLINE_R, mode=Mode.SUBTRACT)
        with Locations((-96.5, 61)):
            Circle(CUT_EXTRUDE16_OUTLINE_R, mode=Mode.SUBTRACT)
    extrude(amount=CUT_EXTRUDE16_DEPTH, mode=Mode.SUBTRACT)

    # Sketch40 → Cut-Extrude17 (cut)
    with BuildSketch(Plane(origin=(0, 88, 0), x_dir=(1, 0, 0), z_dir=(0, 1, 0))):
        Polygon((117.1, 0), (118.9, 0), (118.9, 168.9), (0, 168.9), (0, 167.1), (117.1, 167.1), align=None)
    extrude(amount=-CUT_EXTRUDE17_DEPTH, mode=Mode.SUBTRACT)

    # Sketch42 → Cut-Extrude18 (cut)
    with BuildSketch(Plane(origin=(121, 0, 0), x_dir=(0, 0, -1), z_dir=(1, 0, 0))):
        with Locations((159.5, 44)):
            Rectangle(SKETCH42_W, SKETCH42_H)
    extrude(amount=-CUT_EXTRUDE18_DEPTH, mode=Mode.SUBTRACT)

    # Sketch44 → Boss-Extrude25 (add)
    with BuildSketch(Plane.XY.offset(-125)):
        with Locations((38.875, 16)):
            Rectangle(SKETCH44_W, SKETCH44_H)
    extrude(amount=BOSS_EXTRUDE25_DEPTH)

    # Sketch45 → Boss-Extrude26 (add)
    with BuildSketch(Plane(origin=(0, 0, -167.6), x_dir=(-1, 0, 0), z_dir=(0, 0, -1))):
        Polygon((-65.5, 72.6), (-65.5, 62.6), (-55.5, 72.6), align=None)
        Polygon((-65.5, 15.4), (-65.5, 25.4), (-55.5, 15.4), align=None)
    extrude(amount=-BOSS_EXTRUDE26_DEPTH)

    # Sketch46 → Cut-Extrude19 (cut)
    with BuildSketch(Plane(origin=(0, 0, -167.6), x_dir=(-1, 0, 0), z_dir=(0, 0, -1))):
        with Locations((-62.3, 18.6)):
            Circle(SKETCH46_R)
        with Locations((-62.3, 69.8)):
            Circle(SKETCH46_R)
    extrude(amount=-CUT_EXTRUDE19_DEPTH, mode=Mode.SUBTRACT)

    # Fillet1
    fillet1_edges = [part.edges().sort_by_distance(p)[0] for p in [
        (117.1, 87.5, -167.1),
        (118.9, 87.5, -168.9),
    ]]
    fillet(fillet1_edges, radius=FILLET1_R)

    # Sketch48 → Cut-Extrude21 (cut)
    with BuildSketch(Plane(origin=(0, 6, 0), x_dir=(1, 0, 0), z_dir=(0, 1, 0))):
        with Locations((32.74, 107.6)):
            Rectangle(SKETCH48_W, SKETCH48_H)
    extrude(amount=-CUT_EXTRUDE21_DEPTH, mode=Mode.SUBTRACT)

    # Sketch49 → Boss-Extrude27 (add)
    with BuildSketch(Plane.XY.offset(-97.6)):
        Polygon((10.24, 16), (0.24, 6), (20.24, 6), (45.24, 6), (65.24, 6), (55.24, 16), (55.24, 26), (10.24, 26), align=None)
    extrude(amount=BOSS_EXTRUDE27_DEPTH)

    # Sketch50 → Cut-Extrude22 (cut)
    with BuildSketch(Plane.XZ):
        with Locations(Location((105, -159.5, 0), (0, 0, 270))):
            Circle(SKETCH50_R)
    extrude(amount=-CUT_EXTRUDE22_DEPTH, mode=Mode.SUBTRACT)


solid = part.part
